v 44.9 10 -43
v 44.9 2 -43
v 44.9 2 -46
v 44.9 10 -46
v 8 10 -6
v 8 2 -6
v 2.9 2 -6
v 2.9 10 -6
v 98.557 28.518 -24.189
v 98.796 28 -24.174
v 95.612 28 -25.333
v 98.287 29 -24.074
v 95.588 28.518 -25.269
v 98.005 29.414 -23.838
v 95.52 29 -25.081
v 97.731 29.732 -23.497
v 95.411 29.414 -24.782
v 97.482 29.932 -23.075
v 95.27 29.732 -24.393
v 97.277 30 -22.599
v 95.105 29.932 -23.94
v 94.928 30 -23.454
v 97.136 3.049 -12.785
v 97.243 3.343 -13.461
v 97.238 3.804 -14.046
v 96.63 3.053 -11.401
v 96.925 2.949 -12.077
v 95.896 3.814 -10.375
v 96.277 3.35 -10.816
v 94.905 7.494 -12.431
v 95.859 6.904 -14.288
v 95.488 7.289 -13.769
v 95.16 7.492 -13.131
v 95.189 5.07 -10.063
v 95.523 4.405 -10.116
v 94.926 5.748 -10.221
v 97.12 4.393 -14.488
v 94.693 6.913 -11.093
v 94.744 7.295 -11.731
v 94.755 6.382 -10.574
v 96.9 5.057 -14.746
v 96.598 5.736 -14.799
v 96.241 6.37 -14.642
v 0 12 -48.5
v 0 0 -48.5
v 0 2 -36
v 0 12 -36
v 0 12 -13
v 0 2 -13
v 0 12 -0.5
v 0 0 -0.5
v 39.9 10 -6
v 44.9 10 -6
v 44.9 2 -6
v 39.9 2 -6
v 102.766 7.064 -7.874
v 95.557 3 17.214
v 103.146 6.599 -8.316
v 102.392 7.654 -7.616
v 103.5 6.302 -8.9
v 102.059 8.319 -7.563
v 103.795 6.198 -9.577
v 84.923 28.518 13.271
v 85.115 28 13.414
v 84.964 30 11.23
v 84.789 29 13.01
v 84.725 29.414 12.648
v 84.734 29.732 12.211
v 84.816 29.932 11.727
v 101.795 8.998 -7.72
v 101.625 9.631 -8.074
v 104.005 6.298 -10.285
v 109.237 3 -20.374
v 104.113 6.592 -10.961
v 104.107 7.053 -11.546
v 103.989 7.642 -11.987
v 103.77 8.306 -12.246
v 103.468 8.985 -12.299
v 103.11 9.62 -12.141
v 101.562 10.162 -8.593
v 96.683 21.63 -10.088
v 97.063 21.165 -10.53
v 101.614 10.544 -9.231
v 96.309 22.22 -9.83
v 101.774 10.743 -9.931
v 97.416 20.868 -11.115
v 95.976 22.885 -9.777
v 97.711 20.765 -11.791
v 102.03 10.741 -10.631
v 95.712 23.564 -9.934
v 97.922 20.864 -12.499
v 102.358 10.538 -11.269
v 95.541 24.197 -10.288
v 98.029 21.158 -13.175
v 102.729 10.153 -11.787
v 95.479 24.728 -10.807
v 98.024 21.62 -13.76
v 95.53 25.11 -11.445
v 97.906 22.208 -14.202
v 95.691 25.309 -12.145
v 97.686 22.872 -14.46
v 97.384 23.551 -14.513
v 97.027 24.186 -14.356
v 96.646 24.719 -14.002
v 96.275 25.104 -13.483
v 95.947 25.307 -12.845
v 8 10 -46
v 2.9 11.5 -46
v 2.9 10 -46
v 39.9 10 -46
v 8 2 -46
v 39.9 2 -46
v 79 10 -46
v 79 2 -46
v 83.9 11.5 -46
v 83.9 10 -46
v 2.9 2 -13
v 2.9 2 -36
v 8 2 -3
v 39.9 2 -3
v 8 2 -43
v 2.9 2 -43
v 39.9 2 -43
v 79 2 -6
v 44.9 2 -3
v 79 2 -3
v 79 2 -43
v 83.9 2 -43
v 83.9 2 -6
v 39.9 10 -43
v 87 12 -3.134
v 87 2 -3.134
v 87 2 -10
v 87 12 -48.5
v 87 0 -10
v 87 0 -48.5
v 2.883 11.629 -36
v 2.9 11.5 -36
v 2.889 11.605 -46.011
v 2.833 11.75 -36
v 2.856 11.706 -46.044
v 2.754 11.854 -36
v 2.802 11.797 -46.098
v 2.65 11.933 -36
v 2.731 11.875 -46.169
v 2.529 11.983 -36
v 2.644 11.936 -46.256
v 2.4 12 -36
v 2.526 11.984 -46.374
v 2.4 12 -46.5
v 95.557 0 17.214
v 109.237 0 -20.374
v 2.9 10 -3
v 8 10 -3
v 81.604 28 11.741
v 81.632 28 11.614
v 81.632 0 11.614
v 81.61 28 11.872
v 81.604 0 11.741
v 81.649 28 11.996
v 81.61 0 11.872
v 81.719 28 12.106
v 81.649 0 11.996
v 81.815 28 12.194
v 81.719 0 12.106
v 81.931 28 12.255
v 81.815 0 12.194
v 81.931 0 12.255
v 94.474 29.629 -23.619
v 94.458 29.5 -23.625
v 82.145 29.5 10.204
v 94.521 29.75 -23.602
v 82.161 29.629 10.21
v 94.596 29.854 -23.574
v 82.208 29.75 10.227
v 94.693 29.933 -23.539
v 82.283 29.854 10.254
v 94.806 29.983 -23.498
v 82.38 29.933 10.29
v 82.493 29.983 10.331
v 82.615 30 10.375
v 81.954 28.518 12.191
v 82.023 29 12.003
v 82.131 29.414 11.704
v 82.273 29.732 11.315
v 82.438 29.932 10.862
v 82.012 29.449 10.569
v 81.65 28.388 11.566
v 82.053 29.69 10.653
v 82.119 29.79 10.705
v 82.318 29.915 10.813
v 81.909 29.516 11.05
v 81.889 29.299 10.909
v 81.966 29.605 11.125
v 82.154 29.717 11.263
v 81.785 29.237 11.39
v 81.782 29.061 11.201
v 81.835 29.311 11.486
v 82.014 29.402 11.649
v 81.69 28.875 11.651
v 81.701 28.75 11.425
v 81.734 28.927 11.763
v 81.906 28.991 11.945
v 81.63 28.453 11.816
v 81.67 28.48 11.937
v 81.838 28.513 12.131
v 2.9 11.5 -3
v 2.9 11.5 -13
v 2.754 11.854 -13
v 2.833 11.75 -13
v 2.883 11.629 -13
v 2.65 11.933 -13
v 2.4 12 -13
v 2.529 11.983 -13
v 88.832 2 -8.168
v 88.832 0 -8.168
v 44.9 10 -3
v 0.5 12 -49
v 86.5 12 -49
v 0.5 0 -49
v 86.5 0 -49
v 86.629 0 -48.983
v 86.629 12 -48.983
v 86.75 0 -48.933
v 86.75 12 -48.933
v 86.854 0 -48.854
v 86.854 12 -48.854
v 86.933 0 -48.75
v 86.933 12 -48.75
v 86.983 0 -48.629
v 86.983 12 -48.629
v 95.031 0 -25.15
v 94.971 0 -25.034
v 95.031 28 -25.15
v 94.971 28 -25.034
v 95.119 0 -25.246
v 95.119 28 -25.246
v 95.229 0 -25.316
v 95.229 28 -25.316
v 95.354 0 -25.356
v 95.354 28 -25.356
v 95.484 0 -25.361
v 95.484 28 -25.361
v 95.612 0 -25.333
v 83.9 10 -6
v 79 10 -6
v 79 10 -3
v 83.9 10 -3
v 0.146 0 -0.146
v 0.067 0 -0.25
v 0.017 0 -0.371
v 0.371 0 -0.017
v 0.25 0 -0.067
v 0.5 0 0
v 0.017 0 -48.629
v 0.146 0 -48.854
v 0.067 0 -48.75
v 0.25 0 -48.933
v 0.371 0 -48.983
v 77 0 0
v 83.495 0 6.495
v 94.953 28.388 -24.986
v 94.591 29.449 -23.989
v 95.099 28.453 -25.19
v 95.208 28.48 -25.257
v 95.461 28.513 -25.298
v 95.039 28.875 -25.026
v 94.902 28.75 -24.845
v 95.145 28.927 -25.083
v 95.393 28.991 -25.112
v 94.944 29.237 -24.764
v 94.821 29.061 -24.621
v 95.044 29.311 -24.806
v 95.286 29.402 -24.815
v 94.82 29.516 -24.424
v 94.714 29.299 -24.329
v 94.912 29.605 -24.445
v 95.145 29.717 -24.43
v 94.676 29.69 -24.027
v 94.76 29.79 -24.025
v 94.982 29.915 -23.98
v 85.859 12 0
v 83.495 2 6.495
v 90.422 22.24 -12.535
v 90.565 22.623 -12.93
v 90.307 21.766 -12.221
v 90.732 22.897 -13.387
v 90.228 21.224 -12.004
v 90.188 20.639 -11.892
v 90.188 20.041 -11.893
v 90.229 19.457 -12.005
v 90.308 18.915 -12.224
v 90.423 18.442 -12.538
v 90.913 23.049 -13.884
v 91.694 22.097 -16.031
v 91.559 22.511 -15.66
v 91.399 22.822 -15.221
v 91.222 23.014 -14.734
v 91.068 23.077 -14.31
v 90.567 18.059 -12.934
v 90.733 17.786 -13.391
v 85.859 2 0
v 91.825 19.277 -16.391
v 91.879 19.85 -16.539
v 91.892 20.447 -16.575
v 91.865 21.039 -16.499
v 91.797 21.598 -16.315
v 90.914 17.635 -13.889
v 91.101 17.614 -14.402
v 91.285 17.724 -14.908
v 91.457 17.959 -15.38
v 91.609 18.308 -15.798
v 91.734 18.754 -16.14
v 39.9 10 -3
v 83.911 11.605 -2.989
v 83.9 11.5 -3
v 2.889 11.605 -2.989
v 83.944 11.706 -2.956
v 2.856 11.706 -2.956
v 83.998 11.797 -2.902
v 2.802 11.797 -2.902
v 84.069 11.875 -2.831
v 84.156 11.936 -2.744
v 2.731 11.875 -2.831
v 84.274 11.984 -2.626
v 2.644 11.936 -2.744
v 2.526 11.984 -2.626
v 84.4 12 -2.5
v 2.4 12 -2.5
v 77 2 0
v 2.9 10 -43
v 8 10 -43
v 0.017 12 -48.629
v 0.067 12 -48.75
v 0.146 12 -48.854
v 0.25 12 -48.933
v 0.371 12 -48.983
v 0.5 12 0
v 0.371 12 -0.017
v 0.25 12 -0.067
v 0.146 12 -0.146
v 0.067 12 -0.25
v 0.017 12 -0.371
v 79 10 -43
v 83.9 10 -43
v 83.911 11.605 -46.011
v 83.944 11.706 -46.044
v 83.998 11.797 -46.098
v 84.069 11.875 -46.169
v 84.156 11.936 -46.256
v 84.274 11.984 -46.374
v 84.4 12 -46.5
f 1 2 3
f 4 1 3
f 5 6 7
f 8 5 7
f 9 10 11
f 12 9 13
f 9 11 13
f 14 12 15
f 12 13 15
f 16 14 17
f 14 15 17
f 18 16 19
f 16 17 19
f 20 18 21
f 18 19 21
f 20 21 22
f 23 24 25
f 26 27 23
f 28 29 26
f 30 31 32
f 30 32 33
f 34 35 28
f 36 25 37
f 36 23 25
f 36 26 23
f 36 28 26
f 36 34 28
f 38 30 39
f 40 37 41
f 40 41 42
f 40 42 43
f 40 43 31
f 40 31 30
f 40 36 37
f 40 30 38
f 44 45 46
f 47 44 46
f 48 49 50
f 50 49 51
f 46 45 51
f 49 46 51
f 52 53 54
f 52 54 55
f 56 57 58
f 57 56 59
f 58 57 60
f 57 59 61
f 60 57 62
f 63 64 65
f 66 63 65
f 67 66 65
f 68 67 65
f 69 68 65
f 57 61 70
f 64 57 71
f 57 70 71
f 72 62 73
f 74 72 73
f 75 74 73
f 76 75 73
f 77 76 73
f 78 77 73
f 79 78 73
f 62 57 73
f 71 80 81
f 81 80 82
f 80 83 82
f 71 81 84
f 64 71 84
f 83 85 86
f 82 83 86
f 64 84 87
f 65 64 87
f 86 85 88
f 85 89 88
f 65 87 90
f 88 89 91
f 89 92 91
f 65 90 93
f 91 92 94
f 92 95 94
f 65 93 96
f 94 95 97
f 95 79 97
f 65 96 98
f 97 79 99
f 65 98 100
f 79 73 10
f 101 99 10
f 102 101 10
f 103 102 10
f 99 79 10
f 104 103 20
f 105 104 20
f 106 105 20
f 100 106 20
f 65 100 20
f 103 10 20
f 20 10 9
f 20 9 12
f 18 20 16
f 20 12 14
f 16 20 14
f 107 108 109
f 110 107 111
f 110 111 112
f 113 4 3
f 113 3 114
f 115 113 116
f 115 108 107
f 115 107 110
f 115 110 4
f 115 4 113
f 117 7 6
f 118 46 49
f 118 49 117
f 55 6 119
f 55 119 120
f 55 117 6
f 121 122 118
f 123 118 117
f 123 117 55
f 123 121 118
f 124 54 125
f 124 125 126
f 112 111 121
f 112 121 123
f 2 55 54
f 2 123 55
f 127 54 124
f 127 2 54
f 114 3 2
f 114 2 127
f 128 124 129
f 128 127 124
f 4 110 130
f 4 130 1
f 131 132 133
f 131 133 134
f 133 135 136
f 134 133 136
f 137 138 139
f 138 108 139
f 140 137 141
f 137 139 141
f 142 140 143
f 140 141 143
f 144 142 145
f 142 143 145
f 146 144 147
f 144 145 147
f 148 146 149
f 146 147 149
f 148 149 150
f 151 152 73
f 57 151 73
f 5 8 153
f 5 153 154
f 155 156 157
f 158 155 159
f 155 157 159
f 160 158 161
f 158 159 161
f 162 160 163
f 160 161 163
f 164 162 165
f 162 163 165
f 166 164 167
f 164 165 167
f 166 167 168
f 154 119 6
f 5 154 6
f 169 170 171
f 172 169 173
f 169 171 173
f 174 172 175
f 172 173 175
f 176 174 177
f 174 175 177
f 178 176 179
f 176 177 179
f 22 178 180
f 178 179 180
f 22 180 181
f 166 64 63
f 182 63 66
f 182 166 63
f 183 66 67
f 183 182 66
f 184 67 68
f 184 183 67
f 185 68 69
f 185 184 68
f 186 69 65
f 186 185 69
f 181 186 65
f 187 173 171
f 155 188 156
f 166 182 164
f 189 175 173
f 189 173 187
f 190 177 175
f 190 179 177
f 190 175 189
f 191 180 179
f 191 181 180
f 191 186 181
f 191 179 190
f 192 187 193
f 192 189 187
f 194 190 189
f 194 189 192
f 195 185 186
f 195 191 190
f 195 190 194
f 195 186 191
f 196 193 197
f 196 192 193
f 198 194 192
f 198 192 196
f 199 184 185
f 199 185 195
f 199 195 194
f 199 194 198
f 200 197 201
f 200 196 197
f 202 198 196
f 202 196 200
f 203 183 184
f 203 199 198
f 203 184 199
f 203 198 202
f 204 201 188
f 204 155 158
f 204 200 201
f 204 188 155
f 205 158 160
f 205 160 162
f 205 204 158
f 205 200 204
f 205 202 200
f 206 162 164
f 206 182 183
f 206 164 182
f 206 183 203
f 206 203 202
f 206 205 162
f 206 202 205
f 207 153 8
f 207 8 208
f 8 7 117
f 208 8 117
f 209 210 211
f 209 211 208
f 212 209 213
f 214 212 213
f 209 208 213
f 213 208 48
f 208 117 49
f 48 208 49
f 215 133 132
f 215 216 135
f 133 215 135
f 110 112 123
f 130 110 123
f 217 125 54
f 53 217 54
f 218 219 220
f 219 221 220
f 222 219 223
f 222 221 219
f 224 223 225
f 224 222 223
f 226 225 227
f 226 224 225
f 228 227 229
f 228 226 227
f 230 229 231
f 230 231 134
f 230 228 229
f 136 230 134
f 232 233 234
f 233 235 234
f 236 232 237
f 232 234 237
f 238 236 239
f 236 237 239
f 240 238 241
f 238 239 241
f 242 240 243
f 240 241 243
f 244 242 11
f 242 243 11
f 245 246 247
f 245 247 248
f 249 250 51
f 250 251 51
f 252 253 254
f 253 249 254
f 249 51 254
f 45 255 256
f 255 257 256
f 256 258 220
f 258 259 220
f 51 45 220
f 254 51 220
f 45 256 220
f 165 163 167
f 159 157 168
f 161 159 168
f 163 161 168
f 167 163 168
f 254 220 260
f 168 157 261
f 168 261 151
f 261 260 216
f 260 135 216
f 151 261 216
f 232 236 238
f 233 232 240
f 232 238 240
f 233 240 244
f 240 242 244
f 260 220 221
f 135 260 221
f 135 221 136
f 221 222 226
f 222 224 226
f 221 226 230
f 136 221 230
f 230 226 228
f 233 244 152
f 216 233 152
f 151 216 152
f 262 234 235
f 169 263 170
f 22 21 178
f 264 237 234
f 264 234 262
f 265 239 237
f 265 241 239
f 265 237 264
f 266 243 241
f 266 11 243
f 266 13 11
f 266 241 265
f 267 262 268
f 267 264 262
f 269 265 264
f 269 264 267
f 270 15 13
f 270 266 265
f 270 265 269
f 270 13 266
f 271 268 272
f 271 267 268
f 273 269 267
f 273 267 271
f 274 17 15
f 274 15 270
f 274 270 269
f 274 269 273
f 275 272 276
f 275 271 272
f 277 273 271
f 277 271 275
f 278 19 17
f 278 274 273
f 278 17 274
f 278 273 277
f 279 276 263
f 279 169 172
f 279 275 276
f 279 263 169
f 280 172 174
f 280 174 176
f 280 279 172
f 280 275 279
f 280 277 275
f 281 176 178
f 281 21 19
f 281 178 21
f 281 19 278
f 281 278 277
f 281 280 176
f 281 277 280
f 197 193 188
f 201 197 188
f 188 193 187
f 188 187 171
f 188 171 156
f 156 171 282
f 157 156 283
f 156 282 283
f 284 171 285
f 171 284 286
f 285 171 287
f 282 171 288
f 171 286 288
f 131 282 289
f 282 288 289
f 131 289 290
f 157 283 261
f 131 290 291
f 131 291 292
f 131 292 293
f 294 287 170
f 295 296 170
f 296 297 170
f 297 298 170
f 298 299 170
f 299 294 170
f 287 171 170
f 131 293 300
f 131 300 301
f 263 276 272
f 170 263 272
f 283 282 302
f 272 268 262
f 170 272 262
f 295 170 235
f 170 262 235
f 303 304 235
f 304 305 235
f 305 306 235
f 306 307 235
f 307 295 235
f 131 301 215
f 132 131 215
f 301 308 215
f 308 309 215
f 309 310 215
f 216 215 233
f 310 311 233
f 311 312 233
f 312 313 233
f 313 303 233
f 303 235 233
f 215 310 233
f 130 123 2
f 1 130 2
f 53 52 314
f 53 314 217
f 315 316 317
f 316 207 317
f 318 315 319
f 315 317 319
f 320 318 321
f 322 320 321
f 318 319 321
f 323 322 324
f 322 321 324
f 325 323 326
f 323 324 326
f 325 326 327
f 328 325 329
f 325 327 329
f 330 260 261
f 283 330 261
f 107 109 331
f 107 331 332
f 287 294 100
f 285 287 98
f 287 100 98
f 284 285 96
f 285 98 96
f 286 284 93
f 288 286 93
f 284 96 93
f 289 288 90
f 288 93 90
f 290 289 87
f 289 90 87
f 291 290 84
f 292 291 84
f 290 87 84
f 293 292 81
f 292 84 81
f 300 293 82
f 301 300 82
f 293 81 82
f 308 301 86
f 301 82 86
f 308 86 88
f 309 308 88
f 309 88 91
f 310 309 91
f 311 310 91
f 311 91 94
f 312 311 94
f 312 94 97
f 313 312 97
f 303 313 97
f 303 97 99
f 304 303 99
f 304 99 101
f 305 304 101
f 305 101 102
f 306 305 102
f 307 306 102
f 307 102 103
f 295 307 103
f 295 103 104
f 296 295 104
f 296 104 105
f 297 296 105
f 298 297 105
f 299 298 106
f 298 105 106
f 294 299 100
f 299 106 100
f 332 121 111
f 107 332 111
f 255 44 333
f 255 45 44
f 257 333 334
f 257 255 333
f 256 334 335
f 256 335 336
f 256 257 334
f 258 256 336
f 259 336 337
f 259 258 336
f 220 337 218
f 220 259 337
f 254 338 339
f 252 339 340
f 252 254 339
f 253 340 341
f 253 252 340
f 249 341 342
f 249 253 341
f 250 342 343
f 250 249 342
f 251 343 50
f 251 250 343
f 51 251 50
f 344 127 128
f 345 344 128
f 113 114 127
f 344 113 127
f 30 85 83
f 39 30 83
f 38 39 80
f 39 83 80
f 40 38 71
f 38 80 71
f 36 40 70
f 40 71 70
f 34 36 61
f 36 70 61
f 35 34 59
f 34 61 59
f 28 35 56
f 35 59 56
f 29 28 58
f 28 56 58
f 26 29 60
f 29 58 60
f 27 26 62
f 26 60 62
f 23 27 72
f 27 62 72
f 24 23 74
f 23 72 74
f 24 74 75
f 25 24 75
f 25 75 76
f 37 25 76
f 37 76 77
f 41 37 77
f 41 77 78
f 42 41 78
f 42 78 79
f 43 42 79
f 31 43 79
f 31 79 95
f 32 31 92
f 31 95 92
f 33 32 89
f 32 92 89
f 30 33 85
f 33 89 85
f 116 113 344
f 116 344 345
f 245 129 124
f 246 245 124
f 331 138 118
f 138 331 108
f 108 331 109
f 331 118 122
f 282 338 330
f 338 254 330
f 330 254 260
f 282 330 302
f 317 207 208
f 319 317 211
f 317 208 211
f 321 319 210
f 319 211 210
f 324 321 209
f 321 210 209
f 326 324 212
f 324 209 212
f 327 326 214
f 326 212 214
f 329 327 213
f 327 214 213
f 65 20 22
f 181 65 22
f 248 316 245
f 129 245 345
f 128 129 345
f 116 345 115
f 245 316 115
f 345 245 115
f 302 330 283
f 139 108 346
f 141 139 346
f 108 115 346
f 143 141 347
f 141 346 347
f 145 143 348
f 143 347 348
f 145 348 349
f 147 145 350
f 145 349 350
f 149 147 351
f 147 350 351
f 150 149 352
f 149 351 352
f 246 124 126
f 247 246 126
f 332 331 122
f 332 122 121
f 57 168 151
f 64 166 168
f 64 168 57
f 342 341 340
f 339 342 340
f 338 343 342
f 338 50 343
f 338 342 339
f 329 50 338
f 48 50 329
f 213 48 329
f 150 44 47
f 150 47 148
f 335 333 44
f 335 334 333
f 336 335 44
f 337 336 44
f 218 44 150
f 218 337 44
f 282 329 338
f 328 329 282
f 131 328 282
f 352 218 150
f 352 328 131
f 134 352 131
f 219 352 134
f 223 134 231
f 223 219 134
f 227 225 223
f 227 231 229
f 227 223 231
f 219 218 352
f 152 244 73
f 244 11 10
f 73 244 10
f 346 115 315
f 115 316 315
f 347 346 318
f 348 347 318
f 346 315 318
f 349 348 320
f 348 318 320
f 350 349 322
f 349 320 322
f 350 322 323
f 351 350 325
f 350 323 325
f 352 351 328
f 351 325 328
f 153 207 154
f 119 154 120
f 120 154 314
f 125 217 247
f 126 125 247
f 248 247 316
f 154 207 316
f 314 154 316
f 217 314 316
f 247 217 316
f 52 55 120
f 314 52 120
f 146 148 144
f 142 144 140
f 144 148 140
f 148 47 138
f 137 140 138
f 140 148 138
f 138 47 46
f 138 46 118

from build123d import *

# Parameters (mm, degrees)
BOSS_EXTRUDE1_DEPTH   = 40
BODY_MOVE_COPY1_ANGLE = 20
BOSS_EXTRUDE2_DEPTH   = 2
BOSS_EXTRUDE3_DEPTH   = 12
SKETCH4_R             = 2.5
CUT_EXTRUDE2_DEPTH    = 8
FILLET1_R             = 2
SKETCH10_W            = 4.9
SKETCH10_H            = 3
SKETCH10_W_2          = 5.1
SKETCH10_W_3          = 5
CUT_EXTRUDE4_DEPTH    = 2
FILLET2_R             = 0.5


with BuildPart() as part:
    # Sketch2 → Boss-Extrude1 (new body)
    with BuildSketch(Plane.XY):
        Polygon((90, 0), (105, 0), (105, 3), (93, 30), (90, 30), align=None)
    extrude(amount=BOSS_EXTRUDE1_DEPTH)


with BuildPart() as part_1:
    # Body-Move/Copy1: moved
    add(part.part.rotate(Axis((95, 0, 20), (0, -1, 0)), BODY_MOVE_COPY1_ANGLE))


with BuildPart() as part_2:
    # Body-Move/Copy2: moved
    add(part_1.part.moved(Location((-2, 0, -25))))

    # Sketch1 → Boss-Extrude2 (add)
    with BuildSketch(Plane(origin=(0, 0, 0), x_dir=(1, 0, 0), z_dir=(0, 1, 0))):
        Polygon((0, 49), (0, 0), (77, 0), (89.02081528, -12.02081528), (99.02081528, -2.02081528), (87, 10), (87, 49), align=None)
    extrude(amount=BOSS_EXTRUDE2_DEPTH)

    # Sketch1<4> → Boss-Extrude3 (add)
    with BuildSketch(Plane(origin=(0, 0, 0), x_dir=(1, 0, 0), z_dir=(0, 1, 0))):
        Polygon((8, 43), (8, 46), (39.9, 46), (39.9, 43), (44.9, 43), (44.9, 46), (79, 46), (79, 43), (83.9, 43), (83.9, 6), (79, 6), (79, 3), (44.9, 3), (44.9, 6), (39.9, 6), (39.9, 3), (8, 3), (8, 6), (2.9, 6), (2.9, 13), (0, 13), (0, 0), (77, 0), (87, 0), (87, 10), (87, 49), (0, 49), (0, 36), (2.9, 36), (2.9, 43), align=None)
    extrude(amount=BOSS_EXTRUDE3_DEPTH)

    # Sketch4 → Cut-Extrude2 (cut)
    with BuildSketch(Plane(origin=(76.126595154, 36.005435759, 27.707814672), x_dir=(0.29946549765090347, 0.09724282163216282, -0.9491386881576961), z_dir=(0.8587019690275818, 0.40613846605344794, 0.3125419568312492))):
        with Locations((42.744832372, -18.834040509)):
            Circle(SKETCH4_R)
        with Locations((41.048584848, -34.683530859)):
            Circle(SKETCH4_R)
    extrude(amount=-CUT_EXTRUDE2_DEPTH, mode=Mode.SUBTRACT)

    # Fillet1
    fillet1_edges = [part_2.edges().sort_by_distance(p)[0] for p in [
        (96.551478694, 30, -24.990922917),
        (82.870672961, 30, 12.596781914),
    ]]
    fillet(fillet1_edges, radius=FILLET1_R)

    # Sketch10 → Cut-Extrude4 (cut)
    with BuildSketch(Plane(origin=(0, 12, 0), x_dir=(1, 0, 0), z_dir=(0, 1, 0))):
        with Locations((81.45, 4.5)):
            Rectangle(SKETCH10_W, SKETCH10_H)
        with Locations((42.45, 4.5)):
            Rectangle(SKETCH10_W_2, SKETCH10_H)
        with Locations((42.4, 44.5)):
            Rectangle(SKETCH10_W_3, SKETCH10_H)
        with Locations((81.45, 44.5)):
            Rectangle(SKETCH10_W, SKETCH10_H)
        with Locations((5.45, 44.5)):
            Rectangle(SKETCH10_W_2, SKETCH10_H)
        with Locations((5.45, 4.5)):
            Rectangle(SKETCH10_W_2, SKETCH10_H)
    extrude(amount=-CUT_EXTRUDE4_DEPTH, mode=Mode.SUBTRACT)

    # Fillet2
    fillet2_edges = [part_2.edges().sort_by_distance(p)[0] for p in [
        (2.9, 12, -8),
        (2.9, 12, -41),
        (0, 6, 0),
        (87, 6, -49),
        (0, 6, -49),
        (94.941589001, 29.414213562, -24.95349394),
        (88.301536896, 30, -6.710100717),
        (81.661484791, 29.414213562, 11.533292506),
        (95.141939763, 14, -25.503953132),
        (81.46113403, 14, 12.083751699),
        (43.4, 12, -3),
        (83.9, 12, -24.5),
        (43.4, 12, -46),
    ]]
    fillet(fillet2_edges, radius=FILLET2_R)


solid = part_2.part
